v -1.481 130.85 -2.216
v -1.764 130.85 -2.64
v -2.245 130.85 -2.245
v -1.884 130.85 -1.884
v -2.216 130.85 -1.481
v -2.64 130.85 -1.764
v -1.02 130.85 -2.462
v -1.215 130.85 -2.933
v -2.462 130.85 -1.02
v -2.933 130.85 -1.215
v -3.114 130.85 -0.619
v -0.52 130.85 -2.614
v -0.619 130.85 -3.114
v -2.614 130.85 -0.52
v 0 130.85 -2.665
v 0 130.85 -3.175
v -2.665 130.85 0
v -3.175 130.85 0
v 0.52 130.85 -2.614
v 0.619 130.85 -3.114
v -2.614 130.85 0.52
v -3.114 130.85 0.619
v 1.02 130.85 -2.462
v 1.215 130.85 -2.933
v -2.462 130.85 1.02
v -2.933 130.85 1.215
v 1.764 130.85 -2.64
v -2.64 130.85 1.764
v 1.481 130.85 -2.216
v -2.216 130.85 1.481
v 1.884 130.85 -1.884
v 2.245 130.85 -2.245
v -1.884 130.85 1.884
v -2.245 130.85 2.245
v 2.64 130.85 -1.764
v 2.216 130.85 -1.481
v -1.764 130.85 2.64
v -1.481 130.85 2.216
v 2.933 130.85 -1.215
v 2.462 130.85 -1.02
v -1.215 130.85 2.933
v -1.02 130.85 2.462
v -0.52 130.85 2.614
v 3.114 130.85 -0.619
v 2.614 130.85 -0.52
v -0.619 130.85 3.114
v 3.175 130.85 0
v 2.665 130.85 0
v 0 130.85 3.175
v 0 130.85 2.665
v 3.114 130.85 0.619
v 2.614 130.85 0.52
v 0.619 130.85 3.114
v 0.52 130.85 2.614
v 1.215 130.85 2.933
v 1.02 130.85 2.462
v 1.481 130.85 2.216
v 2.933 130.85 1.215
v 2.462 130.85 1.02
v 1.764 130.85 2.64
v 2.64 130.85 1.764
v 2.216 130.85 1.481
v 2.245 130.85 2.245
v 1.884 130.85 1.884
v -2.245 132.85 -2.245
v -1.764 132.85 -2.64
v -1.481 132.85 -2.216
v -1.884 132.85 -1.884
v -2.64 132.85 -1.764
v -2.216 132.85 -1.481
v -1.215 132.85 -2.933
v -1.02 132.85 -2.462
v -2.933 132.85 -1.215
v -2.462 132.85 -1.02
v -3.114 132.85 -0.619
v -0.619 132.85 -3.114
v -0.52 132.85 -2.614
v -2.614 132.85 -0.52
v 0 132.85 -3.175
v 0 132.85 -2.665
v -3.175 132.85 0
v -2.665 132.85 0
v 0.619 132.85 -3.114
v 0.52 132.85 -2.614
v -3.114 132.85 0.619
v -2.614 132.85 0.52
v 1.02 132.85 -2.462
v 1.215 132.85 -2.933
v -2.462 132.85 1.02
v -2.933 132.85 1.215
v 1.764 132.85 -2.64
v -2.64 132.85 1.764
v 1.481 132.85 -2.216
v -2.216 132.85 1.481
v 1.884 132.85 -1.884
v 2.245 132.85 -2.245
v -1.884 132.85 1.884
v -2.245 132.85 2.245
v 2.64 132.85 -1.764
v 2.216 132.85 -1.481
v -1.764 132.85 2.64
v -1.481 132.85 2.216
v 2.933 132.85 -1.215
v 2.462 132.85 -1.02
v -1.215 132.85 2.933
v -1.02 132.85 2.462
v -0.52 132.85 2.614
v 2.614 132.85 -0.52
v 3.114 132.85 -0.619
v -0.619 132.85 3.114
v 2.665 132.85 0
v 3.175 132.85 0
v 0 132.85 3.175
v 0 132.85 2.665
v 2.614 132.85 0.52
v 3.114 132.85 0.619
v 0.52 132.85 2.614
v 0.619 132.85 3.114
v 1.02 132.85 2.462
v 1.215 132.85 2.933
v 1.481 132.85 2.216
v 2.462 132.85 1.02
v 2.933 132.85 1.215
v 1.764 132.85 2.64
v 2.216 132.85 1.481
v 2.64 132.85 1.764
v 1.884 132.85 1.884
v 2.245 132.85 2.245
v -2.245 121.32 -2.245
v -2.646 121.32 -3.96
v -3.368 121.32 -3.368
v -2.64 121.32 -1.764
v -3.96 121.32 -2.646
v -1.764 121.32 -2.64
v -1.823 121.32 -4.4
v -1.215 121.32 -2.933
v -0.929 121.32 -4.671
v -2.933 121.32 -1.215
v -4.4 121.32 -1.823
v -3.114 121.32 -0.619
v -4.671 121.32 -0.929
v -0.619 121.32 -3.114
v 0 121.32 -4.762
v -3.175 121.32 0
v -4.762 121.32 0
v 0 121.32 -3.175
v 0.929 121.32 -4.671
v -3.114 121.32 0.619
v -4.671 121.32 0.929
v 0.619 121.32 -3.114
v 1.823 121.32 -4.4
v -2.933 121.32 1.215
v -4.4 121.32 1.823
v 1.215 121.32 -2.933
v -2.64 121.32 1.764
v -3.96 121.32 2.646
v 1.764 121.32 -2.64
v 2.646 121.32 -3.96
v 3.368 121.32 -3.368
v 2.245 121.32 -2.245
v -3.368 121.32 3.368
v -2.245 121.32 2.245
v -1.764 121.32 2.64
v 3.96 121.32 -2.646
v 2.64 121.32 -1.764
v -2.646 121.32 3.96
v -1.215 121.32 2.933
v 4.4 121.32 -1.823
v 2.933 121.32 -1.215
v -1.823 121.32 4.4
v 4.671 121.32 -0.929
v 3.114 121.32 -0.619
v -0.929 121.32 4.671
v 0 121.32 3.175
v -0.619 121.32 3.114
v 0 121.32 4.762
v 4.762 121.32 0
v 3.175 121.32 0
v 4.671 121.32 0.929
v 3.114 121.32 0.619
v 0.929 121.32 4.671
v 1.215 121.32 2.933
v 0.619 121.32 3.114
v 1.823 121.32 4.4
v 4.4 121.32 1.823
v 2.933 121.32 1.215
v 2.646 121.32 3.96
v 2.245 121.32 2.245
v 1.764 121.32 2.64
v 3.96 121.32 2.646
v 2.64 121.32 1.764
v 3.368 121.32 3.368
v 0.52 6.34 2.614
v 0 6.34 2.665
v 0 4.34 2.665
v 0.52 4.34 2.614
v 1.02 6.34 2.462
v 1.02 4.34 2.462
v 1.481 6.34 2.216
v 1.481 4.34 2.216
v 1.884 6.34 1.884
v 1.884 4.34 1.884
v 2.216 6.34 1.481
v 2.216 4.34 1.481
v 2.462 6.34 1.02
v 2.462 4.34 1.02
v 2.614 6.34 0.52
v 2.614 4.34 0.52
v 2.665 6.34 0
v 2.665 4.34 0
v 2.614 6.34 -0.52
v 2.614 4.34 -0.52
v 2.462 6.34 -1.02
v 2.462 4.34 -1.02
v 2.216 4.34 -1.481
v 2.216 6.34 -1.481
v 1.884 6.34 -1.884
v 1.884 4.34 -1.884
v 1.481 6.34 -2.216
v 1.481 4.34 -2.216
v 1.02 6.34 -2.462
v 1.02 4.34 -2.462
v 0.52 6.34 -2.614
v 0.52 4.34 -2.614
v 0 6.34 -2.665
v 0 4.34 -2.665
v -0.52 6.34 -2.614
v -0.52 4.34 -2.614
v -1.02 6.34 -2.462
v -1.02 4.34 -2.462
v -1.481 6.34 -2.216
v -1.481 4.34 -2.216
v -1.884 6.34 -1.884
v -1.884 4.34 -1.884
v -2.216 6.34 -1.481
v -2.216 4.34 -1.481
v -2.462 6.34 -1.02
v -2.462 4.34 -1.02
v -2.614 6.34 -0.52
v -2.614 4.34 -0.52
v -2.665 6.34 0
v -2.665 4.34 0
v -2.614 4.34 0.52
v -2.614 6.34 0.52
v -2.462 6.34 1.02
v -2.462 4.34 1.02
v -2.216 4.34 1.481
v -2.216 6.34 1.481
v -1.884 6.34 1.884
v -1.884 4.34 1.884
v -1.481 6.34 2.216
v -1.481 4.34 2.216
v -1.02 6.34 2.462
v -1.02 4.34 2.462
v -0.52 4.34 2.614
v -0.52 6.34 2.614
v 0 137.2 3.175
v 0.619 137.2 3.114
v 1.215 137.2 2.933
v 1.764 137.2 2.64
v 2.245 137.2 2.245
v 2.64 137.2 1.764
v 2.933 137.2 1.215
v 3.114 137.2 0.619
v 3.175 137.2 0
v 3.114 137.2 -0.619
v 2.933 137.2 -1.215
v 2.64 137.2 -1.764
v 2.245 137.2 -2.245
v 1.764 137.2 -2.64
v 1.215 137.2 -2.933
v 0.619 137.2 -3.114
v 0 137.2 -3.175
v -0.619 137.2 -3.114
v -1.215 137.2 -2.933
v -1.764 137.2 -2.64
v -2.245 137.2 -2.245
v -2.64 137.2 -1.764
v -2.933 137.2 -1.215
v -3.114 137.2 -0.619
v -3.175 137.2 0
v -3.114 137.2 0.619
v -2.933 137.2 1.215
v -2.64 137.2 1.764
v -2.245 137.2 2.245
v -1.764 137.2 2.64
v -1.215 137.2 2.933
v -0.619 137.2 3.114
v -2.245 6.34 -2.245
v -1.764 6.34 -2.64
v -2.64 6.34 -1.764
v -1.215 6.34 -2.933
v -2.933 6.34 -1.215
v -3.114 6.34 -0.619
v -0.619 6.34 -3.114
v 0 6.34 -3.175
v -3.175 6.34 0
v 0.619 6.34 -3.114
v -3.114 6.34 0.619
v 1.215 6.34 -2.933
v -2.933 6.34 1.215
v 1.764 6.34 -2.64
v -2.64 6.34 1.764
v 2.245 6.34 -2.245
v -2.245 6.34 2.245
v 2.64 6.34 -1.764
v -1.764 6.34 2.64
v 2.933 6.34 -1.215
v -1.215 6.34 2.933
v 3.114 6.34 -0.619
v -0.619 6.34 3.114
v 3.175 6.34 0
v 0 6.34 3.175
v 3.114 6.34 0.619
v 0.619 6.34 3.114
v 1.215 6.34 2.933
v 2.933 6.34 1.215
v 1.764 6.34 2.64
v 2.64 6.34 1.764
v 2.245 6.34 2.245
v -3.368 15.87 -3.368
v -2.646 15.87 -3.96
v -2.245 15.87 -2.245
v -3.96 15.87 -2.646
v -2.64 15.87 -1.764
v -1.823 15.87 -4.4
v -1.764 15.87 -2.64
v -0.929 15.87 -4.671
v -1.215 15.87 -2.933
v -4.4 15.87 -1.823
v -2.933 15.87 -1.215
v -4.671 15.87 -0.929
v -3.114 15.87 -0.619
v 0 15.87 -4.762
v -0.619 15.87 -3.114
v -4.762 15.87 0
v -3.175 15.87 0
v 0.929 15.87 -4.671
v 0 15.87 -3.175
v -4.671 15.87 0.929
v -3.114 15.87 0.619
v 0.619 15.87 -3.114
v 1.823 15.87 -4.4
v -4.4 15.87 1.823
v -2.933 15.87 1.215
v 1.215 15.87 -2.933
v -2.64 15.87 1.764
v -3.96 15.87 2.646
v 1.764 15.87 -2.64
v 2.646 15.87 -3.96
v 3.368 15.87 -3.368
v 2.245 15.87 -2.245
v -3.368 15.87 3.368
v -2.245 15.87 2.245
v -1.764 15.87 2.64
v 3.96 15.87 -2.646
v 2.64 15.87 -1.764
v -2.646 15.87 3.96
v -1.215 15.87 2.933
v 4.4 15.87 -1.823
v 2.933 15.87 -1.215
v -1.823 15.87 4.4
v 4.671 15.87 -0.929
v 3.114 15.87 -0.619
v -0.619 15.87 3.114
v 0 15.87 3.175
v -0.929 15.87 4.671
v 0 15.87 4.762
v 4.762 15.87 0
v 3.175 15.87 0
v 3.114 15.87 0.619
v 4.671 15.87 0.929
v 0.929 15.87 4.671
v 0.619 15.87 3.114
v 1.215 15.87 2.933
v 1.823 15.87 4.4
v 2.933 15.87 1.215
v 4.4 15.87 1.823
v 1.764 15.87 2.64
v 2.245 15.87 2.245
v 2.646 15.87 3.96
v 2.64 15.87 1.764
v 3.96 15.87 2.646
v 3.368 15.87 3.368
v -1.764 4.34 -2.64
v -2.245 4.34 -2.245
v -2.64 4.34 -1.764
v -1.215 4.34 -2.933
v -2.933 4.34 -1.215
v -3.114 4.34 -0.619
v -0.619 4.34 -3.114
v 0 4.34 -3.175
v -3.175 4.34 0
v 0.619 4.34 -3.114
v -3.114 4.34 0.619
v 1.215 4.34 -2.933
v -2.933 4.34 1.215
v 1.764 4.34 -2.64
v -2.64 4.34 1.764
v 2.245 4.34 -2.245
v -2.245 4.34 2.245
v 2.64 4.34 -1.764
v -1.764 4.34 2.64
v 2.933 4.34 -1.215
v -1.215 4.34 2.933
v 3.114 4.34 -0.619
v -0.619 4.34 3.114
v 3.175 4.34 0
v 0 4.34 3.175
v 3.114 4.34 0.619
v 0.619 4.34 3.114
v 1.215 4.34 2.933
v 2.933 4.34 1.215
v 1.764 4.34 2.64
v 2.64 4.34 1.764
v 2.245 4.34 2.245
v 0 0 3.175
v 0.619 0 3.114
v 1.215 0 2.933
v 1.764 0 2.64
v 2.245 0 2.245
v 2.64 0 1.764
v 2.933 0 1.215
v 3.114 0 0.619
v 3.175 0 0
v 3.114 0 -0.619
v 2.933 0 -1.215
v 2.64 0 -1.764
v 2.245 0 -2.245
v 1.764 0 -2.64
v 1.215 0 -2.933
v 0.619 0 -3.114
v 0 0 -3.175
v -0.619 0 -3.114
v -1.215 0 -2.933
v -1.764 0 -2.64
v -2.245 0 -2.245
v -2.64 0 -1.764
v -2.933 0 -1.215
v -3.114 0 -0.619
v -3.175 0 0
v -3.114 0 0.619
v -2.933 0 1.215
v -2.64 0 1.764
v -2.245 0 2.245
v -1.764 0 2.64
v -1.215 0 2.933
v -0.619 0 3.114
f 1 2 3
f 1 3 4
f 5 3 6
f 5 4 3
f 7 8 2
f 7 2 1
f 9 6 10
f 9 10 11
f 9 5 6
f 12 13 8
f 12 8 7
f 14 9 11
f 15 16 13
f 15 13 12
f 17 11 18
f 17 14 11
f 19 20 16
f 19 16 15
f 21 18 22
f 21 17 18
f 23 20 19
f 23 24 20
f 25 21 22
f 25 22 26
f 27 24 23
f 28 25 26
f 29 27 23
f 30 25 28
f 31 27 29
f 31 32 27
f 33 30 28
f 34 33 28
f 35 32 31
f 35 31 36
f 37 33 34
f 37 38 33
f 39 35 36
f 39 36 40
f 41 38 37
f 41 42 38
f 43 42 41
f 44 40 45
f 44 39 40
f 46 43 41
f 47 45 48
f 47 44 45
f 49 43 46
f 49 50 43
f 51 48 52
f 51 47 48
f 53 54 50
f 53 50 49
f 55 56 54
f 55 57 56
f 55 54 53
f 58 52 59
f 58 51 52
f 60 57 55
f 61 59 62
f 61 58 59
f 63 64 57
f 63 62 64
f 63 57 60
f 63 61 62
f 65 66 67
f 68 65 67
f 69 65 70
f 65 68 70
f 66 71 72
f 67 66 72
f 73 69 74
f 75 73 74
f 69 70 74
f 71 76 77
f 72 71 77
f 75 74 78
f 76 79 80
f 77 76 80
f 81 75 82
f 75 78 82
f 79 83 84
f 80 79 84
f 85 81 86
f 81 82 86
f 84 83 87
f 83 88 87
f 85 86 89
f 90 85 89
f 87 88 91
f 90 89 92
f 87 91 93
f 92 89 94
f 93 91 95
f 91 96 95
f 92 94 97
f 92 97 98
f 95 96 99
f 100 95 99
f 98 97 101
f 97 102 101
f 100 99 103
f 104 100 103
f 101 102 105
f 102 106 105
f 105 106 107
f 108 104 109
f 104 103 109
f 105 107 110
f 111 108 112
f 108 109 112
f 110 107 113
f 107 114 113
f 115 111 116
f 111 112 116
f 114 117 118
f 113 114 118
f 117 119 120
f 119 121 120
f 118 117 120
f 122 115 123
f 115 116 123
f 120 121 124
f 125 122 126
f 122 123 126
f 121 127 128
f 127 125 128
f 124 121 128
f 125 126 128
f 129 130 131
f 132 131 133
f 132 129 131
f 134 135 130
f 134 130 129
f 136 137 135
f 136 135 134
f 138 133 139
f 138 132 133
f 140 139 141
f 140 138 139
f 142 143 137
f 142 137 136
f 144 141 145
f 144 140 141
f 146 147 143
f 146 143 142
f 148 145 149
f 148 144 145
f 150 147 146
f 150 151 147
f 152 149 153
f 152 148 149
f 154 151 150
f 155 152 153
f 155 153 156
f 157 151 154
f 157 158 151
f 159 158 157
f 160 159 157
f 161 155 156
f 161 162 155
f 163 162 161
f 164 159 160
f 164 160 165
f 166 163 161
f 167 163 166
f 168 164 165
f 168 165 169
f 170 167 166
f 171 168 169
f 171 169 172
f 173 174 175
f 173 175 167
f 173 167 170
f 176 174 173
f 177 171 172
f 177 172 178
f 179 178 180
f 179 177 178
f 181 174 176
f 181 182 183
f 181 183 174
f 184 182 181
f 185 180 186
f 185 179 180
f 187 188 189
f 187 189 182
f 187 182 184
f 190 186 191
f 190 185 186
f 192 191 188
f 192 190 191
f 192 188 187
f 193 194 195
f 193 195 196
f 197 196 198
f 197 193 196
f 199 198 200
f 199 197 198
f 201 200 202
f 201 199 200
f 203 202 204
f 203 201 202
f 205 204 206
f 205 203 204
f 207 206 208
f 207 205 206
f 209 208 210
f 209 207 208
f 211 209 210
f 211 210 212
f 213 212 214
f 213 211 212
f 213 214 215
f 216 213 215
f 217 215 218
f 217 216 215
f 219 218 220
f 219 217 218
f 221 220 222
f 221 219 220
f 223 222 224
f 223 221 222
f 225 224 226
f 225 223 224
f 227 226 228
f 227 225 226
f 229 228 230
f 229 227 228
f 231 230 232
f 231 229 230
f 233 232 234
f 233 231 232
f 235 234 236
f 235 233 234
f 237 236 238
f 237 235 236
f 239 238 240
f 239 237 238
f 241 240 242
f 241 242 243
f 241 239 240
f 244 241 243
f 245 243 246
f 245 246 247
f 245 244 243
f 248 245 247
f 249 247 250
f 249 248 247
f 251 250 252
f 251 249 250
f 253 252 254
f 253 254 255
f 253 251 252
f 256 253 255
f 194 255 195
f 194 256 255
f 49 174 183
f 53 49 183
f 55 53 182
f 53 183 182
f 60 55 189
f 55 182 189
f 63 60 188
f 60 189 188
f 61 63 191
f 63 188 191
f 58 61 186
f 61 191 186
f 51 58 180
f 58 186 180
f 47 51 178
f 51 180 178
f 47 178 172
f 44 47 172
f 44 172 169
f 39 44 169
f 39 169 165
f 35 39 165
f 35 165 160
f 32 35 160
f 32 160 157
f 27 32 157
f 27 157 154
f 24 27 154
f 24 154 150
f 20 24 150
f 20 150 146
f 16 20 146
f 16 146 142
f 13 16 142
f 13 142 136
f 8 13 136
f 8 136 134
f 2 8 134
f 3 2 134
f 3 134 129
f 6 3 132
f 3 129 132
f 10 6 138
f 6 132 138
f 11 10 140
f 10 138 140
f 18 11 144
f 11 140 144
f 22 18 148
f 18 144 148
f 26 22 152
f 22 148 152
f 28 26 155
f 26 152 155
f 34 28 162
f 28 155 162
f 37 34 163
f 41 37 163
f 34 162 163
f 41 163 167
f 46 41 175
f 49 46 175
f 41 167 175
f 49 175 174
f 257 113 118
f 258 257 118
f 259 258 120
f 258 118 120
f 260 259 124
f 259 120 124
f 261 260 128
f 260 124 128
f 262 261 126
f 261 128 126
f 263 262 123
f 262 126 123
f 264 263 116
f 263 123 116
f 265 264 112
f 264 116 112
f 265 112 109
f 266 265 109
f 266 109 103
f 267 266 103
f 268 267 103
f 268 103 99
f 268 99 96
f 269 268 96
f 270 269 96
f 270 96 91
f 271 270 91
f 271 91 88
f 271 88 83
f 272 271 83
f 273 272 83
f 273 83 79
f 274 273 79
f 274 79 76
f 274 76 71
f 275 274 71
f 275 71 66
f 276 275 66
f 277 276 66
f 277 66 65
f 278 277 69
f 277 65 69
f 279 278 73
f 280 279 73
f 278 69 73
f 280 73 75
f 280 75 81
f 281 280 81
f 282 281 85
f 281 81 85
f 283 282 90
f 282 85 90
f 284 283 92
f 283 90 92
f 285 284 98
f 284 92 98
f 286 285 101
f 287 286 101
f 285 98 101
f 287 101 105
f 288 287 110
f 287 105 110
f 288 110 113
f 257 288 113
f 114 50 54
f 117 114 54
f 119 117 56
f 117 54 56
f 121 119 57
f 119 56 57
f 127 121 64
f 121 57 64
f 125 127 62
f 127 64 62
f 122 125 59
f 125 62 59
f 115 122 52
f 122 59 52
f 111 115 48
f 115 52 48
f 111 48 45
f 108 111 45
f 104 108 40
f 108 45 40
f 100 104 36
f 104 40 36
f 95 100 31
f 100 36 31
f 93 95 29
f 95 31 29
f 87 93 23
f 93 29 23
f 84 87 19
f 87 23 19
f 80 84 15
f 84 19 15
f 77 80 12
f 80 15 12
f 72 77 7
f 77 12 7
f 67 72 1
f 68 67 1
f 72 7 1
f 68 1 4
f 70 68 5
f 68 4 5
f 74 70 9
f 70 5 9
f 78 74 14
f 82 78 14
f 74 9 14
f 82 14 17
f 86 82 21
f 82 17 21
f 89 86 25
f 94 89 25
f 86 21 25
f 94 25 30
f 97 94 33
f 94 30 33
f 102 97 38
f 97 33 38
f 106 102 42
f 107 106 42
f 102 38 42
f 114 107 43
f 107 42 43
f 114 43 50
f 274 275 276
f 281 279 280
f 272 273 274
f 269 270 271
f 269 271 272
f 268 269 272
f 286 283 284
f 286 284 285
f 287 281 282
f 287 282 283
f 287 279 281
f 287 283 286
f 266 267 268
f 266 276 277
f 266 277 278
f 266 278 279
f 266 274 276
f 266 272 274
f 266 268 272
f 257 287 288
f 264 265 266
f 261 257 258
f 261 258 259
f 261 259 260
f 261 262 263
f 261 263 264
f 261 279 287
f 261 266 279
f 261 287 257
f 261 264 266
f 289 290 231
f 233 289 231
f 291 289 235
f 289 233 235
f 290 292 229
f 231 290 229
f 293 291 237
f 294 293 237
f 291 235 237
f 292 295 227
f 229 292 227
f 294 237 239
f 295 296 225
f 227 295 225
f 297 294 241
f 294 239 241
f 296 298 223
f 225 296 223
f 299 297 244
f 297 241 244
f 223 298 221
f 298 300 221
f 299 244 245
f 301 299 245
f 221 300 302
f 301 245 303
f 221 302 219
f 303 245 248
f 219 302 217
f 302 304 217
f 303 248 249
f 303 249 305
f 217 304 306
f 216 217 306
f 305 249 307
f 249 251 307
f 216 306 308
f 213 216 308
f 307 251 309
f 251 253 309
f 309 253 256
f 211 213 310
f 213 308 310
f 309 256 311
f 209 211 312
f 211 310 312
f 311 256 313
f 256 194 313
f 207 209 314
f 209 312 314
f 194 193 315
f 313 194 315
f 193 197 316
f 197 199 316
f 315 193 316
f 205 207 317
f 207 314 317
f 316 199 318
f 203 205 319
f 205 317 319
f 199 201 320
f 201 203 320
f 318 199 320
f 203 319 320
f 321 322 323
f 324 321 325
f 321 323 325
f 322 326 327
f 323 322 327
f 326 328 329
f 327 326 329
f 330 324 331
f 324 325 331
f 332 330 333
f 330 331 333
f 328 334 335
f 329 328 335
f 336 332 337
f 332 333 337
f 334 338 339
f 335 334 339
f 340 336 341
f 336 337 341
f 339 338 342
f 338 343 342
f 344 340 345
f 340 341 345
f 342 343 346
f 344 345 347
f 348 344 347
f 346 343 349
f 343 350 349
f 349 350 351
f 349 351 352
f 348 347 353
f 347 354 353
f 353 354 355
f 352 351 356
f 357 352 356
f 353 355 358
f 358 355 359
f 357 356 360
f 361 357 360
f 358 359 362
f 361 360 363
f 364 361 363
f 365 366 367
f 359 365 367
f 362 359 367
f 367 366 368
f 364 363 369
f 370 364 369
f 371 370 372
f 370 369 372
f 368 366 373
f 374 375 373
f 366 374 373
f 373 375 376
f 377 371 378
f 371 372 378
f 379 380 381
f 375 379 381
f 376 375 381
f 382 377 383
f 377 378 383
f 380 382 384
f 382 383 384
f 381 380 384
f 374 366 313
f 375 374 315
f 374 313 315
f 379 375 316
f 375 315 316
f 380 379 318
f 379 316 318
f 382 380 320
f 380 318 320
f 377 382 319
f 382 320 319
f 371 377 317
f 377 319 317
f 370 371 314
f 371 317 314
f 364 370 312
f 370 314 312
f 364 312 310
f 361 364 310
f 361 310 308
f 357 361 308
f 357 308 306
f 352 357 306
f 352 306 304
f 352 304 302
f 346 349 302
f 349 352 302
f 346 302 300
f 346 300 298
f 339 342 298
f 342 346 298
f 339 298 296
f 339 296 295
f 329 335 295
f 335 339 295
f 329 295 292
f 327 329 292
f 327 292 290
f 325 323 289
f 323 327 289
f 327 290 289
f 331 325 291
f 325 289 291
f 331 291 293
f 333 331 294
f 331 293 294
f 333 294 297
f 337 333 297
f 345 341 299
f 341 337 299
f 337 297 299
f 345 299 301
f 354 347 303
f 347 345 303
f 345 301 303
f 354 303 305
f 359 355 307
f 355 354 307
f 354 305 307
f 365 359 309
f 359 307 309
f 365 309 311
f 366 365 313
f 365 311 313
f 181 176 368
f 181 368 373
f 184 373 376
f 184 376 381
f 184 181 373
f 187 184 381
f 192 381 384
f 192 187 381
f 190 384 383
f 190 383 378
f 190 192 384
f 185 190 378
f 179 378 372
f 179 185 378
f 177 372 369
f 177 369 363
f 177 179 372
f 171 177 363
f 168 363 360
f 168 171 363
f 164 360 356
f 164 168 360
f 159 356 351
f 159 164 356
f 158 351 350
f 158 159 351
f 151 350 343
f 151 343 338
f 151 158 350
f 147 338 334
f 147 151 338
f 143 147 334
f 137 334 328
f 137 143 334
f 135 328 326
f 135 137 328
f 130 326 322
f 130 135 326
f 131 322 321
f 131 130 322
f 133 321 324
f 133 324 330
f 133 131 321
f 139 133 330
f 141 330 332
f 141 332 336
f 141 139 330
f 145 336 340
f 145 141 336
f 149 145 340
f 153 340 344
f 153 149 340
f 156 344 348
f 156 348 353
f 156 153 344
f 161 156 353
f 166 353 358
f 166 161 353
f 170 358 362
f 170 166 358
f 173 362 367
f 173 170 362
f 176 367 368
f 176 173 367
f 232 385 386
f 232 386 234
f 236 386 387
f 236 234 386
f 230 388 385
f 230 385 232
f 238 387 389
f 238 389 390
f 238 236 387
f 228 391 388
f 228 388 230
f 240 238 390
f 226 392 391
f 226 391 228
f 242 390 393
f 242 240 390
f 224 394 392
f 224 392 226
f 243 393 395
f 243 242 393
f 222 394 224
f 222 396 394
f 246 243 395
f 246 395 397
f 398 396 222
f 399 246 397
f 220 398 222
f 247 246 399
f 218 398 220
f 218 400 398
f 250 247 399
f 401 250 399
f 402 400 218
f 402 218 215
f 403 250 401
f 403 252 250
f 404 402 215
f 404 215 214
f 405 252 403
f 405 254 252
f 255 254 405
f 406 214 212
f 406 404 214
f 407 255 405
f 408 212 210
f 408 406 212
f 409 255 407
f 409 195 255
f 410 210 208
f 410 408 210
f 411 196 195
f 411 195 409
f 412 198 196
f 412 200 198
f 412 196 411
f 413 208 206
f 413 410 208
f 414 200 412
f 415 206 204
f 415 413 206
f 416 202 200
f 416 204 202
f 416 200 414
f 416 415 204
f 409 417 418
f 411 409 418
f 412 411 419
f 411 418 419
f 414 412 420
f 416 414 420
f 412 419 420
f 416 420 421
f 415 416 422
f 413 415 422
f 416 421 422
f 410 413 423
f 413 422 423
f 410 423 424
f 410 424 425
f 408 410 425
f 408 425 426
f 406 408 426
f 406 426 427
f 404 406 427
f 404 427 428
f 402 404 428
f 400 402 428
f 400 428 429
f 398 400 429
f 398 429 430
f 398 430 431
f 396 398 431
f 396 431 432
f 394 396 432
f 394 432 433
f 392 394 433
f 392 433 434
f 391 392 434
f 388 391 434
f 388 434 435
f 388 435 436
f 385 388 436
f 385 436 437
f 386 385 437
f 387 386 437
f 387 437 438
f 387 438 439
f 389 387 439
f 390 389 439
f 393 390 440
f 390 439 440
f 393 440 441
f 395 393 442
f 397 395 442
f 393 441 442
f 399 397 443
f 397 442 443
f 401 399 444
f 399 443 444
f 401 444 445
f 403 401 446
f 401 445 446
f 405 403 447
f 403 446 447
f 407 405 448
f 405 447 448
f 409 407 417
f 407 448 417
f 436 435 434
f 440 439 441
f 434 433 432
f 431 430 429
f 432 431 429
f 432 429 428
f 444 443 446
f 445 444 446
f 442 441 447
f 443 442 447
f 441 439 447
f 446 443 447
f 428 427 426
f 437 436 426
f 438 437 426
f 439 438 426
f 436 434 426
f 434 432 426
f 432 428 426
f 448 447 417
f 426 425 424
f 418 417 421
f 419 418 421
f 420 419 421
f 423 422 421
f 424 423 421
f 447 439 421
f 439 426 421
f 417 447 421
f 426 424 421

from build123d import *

# Parameters (mm, degrees)
SKETCH1_R           = 3.175
BOSS_EXTRUDE1_DEPTH = 137.2
BOSS_EXTRUDE2_START = -15.88
SKETCH2_R           = 4.7625
BOSS_EXTRUDE2_DEPTH = 105.45
CUT_EXTRUDE1_START  = 9.53
SKETCH4_R           = 3.175
SKETCH4_R_2         = 2.665
CUT_EXTRUDE1_DEPTH  = 2


with BuildPart() as part:
    # Sketch1 → Boss-Extrude1 (new body)
    with BuildSketch(Plane(origin=(0, 0, 0), x_dir=(1, 0, 0), z_dir=(0, 1, 0))):
        with Locations(Location((0, 0, 0), (0, 0, 270))):
            Circle(SKETCH1_R)
    extrude(amount=BOSS_EXTRUDE1_DEPTH)

    # Sketch2 → Boss-Extrude2 (add)
    with BuildSketch(Plane(origin=(0, 137.2, 0), x_dir=(1, 0, 0), z_dir=(0, 1, 0)).offset(BOSS_EXTRUDE2_START)):
        with Locations(Location((0, 0, 0), (0, 0, 270))):
            Circle(SKETCH2_R)
    extrude(amount=-BOSS_EXTRUDE2_DEPTH)

    # Sketch4 → Cut-Extrude1 (cut)
    with BuildSketch(Plane(origin=(0, 121.32, 0), x_dir=(1, 0, 0), z_dir=(0, 1, 0)).offset(CUT_EXTRUDE1_START)):
        with Locations(Location((0, 0, 0), (0, 0, 270))):
            Circle(SKETCH4_R)
        with Locations(Location((0, 0, 0), (0, 0, 270))):
            Circle(SKETCH4_R_2, mode=Mode.SUBTRACT)
    cut_extrude1 = extrude(amount=CUT_EXTRUDE1_DEPTH, mode=Mode.SUBTRACT)

    # Mirror1: Cut-Extrude1 across plane
    add(cut_extrude1.mirror(Plane.ZX.offset(68.595)), mode=Mode.SUBTRACT)


solid = part.part
